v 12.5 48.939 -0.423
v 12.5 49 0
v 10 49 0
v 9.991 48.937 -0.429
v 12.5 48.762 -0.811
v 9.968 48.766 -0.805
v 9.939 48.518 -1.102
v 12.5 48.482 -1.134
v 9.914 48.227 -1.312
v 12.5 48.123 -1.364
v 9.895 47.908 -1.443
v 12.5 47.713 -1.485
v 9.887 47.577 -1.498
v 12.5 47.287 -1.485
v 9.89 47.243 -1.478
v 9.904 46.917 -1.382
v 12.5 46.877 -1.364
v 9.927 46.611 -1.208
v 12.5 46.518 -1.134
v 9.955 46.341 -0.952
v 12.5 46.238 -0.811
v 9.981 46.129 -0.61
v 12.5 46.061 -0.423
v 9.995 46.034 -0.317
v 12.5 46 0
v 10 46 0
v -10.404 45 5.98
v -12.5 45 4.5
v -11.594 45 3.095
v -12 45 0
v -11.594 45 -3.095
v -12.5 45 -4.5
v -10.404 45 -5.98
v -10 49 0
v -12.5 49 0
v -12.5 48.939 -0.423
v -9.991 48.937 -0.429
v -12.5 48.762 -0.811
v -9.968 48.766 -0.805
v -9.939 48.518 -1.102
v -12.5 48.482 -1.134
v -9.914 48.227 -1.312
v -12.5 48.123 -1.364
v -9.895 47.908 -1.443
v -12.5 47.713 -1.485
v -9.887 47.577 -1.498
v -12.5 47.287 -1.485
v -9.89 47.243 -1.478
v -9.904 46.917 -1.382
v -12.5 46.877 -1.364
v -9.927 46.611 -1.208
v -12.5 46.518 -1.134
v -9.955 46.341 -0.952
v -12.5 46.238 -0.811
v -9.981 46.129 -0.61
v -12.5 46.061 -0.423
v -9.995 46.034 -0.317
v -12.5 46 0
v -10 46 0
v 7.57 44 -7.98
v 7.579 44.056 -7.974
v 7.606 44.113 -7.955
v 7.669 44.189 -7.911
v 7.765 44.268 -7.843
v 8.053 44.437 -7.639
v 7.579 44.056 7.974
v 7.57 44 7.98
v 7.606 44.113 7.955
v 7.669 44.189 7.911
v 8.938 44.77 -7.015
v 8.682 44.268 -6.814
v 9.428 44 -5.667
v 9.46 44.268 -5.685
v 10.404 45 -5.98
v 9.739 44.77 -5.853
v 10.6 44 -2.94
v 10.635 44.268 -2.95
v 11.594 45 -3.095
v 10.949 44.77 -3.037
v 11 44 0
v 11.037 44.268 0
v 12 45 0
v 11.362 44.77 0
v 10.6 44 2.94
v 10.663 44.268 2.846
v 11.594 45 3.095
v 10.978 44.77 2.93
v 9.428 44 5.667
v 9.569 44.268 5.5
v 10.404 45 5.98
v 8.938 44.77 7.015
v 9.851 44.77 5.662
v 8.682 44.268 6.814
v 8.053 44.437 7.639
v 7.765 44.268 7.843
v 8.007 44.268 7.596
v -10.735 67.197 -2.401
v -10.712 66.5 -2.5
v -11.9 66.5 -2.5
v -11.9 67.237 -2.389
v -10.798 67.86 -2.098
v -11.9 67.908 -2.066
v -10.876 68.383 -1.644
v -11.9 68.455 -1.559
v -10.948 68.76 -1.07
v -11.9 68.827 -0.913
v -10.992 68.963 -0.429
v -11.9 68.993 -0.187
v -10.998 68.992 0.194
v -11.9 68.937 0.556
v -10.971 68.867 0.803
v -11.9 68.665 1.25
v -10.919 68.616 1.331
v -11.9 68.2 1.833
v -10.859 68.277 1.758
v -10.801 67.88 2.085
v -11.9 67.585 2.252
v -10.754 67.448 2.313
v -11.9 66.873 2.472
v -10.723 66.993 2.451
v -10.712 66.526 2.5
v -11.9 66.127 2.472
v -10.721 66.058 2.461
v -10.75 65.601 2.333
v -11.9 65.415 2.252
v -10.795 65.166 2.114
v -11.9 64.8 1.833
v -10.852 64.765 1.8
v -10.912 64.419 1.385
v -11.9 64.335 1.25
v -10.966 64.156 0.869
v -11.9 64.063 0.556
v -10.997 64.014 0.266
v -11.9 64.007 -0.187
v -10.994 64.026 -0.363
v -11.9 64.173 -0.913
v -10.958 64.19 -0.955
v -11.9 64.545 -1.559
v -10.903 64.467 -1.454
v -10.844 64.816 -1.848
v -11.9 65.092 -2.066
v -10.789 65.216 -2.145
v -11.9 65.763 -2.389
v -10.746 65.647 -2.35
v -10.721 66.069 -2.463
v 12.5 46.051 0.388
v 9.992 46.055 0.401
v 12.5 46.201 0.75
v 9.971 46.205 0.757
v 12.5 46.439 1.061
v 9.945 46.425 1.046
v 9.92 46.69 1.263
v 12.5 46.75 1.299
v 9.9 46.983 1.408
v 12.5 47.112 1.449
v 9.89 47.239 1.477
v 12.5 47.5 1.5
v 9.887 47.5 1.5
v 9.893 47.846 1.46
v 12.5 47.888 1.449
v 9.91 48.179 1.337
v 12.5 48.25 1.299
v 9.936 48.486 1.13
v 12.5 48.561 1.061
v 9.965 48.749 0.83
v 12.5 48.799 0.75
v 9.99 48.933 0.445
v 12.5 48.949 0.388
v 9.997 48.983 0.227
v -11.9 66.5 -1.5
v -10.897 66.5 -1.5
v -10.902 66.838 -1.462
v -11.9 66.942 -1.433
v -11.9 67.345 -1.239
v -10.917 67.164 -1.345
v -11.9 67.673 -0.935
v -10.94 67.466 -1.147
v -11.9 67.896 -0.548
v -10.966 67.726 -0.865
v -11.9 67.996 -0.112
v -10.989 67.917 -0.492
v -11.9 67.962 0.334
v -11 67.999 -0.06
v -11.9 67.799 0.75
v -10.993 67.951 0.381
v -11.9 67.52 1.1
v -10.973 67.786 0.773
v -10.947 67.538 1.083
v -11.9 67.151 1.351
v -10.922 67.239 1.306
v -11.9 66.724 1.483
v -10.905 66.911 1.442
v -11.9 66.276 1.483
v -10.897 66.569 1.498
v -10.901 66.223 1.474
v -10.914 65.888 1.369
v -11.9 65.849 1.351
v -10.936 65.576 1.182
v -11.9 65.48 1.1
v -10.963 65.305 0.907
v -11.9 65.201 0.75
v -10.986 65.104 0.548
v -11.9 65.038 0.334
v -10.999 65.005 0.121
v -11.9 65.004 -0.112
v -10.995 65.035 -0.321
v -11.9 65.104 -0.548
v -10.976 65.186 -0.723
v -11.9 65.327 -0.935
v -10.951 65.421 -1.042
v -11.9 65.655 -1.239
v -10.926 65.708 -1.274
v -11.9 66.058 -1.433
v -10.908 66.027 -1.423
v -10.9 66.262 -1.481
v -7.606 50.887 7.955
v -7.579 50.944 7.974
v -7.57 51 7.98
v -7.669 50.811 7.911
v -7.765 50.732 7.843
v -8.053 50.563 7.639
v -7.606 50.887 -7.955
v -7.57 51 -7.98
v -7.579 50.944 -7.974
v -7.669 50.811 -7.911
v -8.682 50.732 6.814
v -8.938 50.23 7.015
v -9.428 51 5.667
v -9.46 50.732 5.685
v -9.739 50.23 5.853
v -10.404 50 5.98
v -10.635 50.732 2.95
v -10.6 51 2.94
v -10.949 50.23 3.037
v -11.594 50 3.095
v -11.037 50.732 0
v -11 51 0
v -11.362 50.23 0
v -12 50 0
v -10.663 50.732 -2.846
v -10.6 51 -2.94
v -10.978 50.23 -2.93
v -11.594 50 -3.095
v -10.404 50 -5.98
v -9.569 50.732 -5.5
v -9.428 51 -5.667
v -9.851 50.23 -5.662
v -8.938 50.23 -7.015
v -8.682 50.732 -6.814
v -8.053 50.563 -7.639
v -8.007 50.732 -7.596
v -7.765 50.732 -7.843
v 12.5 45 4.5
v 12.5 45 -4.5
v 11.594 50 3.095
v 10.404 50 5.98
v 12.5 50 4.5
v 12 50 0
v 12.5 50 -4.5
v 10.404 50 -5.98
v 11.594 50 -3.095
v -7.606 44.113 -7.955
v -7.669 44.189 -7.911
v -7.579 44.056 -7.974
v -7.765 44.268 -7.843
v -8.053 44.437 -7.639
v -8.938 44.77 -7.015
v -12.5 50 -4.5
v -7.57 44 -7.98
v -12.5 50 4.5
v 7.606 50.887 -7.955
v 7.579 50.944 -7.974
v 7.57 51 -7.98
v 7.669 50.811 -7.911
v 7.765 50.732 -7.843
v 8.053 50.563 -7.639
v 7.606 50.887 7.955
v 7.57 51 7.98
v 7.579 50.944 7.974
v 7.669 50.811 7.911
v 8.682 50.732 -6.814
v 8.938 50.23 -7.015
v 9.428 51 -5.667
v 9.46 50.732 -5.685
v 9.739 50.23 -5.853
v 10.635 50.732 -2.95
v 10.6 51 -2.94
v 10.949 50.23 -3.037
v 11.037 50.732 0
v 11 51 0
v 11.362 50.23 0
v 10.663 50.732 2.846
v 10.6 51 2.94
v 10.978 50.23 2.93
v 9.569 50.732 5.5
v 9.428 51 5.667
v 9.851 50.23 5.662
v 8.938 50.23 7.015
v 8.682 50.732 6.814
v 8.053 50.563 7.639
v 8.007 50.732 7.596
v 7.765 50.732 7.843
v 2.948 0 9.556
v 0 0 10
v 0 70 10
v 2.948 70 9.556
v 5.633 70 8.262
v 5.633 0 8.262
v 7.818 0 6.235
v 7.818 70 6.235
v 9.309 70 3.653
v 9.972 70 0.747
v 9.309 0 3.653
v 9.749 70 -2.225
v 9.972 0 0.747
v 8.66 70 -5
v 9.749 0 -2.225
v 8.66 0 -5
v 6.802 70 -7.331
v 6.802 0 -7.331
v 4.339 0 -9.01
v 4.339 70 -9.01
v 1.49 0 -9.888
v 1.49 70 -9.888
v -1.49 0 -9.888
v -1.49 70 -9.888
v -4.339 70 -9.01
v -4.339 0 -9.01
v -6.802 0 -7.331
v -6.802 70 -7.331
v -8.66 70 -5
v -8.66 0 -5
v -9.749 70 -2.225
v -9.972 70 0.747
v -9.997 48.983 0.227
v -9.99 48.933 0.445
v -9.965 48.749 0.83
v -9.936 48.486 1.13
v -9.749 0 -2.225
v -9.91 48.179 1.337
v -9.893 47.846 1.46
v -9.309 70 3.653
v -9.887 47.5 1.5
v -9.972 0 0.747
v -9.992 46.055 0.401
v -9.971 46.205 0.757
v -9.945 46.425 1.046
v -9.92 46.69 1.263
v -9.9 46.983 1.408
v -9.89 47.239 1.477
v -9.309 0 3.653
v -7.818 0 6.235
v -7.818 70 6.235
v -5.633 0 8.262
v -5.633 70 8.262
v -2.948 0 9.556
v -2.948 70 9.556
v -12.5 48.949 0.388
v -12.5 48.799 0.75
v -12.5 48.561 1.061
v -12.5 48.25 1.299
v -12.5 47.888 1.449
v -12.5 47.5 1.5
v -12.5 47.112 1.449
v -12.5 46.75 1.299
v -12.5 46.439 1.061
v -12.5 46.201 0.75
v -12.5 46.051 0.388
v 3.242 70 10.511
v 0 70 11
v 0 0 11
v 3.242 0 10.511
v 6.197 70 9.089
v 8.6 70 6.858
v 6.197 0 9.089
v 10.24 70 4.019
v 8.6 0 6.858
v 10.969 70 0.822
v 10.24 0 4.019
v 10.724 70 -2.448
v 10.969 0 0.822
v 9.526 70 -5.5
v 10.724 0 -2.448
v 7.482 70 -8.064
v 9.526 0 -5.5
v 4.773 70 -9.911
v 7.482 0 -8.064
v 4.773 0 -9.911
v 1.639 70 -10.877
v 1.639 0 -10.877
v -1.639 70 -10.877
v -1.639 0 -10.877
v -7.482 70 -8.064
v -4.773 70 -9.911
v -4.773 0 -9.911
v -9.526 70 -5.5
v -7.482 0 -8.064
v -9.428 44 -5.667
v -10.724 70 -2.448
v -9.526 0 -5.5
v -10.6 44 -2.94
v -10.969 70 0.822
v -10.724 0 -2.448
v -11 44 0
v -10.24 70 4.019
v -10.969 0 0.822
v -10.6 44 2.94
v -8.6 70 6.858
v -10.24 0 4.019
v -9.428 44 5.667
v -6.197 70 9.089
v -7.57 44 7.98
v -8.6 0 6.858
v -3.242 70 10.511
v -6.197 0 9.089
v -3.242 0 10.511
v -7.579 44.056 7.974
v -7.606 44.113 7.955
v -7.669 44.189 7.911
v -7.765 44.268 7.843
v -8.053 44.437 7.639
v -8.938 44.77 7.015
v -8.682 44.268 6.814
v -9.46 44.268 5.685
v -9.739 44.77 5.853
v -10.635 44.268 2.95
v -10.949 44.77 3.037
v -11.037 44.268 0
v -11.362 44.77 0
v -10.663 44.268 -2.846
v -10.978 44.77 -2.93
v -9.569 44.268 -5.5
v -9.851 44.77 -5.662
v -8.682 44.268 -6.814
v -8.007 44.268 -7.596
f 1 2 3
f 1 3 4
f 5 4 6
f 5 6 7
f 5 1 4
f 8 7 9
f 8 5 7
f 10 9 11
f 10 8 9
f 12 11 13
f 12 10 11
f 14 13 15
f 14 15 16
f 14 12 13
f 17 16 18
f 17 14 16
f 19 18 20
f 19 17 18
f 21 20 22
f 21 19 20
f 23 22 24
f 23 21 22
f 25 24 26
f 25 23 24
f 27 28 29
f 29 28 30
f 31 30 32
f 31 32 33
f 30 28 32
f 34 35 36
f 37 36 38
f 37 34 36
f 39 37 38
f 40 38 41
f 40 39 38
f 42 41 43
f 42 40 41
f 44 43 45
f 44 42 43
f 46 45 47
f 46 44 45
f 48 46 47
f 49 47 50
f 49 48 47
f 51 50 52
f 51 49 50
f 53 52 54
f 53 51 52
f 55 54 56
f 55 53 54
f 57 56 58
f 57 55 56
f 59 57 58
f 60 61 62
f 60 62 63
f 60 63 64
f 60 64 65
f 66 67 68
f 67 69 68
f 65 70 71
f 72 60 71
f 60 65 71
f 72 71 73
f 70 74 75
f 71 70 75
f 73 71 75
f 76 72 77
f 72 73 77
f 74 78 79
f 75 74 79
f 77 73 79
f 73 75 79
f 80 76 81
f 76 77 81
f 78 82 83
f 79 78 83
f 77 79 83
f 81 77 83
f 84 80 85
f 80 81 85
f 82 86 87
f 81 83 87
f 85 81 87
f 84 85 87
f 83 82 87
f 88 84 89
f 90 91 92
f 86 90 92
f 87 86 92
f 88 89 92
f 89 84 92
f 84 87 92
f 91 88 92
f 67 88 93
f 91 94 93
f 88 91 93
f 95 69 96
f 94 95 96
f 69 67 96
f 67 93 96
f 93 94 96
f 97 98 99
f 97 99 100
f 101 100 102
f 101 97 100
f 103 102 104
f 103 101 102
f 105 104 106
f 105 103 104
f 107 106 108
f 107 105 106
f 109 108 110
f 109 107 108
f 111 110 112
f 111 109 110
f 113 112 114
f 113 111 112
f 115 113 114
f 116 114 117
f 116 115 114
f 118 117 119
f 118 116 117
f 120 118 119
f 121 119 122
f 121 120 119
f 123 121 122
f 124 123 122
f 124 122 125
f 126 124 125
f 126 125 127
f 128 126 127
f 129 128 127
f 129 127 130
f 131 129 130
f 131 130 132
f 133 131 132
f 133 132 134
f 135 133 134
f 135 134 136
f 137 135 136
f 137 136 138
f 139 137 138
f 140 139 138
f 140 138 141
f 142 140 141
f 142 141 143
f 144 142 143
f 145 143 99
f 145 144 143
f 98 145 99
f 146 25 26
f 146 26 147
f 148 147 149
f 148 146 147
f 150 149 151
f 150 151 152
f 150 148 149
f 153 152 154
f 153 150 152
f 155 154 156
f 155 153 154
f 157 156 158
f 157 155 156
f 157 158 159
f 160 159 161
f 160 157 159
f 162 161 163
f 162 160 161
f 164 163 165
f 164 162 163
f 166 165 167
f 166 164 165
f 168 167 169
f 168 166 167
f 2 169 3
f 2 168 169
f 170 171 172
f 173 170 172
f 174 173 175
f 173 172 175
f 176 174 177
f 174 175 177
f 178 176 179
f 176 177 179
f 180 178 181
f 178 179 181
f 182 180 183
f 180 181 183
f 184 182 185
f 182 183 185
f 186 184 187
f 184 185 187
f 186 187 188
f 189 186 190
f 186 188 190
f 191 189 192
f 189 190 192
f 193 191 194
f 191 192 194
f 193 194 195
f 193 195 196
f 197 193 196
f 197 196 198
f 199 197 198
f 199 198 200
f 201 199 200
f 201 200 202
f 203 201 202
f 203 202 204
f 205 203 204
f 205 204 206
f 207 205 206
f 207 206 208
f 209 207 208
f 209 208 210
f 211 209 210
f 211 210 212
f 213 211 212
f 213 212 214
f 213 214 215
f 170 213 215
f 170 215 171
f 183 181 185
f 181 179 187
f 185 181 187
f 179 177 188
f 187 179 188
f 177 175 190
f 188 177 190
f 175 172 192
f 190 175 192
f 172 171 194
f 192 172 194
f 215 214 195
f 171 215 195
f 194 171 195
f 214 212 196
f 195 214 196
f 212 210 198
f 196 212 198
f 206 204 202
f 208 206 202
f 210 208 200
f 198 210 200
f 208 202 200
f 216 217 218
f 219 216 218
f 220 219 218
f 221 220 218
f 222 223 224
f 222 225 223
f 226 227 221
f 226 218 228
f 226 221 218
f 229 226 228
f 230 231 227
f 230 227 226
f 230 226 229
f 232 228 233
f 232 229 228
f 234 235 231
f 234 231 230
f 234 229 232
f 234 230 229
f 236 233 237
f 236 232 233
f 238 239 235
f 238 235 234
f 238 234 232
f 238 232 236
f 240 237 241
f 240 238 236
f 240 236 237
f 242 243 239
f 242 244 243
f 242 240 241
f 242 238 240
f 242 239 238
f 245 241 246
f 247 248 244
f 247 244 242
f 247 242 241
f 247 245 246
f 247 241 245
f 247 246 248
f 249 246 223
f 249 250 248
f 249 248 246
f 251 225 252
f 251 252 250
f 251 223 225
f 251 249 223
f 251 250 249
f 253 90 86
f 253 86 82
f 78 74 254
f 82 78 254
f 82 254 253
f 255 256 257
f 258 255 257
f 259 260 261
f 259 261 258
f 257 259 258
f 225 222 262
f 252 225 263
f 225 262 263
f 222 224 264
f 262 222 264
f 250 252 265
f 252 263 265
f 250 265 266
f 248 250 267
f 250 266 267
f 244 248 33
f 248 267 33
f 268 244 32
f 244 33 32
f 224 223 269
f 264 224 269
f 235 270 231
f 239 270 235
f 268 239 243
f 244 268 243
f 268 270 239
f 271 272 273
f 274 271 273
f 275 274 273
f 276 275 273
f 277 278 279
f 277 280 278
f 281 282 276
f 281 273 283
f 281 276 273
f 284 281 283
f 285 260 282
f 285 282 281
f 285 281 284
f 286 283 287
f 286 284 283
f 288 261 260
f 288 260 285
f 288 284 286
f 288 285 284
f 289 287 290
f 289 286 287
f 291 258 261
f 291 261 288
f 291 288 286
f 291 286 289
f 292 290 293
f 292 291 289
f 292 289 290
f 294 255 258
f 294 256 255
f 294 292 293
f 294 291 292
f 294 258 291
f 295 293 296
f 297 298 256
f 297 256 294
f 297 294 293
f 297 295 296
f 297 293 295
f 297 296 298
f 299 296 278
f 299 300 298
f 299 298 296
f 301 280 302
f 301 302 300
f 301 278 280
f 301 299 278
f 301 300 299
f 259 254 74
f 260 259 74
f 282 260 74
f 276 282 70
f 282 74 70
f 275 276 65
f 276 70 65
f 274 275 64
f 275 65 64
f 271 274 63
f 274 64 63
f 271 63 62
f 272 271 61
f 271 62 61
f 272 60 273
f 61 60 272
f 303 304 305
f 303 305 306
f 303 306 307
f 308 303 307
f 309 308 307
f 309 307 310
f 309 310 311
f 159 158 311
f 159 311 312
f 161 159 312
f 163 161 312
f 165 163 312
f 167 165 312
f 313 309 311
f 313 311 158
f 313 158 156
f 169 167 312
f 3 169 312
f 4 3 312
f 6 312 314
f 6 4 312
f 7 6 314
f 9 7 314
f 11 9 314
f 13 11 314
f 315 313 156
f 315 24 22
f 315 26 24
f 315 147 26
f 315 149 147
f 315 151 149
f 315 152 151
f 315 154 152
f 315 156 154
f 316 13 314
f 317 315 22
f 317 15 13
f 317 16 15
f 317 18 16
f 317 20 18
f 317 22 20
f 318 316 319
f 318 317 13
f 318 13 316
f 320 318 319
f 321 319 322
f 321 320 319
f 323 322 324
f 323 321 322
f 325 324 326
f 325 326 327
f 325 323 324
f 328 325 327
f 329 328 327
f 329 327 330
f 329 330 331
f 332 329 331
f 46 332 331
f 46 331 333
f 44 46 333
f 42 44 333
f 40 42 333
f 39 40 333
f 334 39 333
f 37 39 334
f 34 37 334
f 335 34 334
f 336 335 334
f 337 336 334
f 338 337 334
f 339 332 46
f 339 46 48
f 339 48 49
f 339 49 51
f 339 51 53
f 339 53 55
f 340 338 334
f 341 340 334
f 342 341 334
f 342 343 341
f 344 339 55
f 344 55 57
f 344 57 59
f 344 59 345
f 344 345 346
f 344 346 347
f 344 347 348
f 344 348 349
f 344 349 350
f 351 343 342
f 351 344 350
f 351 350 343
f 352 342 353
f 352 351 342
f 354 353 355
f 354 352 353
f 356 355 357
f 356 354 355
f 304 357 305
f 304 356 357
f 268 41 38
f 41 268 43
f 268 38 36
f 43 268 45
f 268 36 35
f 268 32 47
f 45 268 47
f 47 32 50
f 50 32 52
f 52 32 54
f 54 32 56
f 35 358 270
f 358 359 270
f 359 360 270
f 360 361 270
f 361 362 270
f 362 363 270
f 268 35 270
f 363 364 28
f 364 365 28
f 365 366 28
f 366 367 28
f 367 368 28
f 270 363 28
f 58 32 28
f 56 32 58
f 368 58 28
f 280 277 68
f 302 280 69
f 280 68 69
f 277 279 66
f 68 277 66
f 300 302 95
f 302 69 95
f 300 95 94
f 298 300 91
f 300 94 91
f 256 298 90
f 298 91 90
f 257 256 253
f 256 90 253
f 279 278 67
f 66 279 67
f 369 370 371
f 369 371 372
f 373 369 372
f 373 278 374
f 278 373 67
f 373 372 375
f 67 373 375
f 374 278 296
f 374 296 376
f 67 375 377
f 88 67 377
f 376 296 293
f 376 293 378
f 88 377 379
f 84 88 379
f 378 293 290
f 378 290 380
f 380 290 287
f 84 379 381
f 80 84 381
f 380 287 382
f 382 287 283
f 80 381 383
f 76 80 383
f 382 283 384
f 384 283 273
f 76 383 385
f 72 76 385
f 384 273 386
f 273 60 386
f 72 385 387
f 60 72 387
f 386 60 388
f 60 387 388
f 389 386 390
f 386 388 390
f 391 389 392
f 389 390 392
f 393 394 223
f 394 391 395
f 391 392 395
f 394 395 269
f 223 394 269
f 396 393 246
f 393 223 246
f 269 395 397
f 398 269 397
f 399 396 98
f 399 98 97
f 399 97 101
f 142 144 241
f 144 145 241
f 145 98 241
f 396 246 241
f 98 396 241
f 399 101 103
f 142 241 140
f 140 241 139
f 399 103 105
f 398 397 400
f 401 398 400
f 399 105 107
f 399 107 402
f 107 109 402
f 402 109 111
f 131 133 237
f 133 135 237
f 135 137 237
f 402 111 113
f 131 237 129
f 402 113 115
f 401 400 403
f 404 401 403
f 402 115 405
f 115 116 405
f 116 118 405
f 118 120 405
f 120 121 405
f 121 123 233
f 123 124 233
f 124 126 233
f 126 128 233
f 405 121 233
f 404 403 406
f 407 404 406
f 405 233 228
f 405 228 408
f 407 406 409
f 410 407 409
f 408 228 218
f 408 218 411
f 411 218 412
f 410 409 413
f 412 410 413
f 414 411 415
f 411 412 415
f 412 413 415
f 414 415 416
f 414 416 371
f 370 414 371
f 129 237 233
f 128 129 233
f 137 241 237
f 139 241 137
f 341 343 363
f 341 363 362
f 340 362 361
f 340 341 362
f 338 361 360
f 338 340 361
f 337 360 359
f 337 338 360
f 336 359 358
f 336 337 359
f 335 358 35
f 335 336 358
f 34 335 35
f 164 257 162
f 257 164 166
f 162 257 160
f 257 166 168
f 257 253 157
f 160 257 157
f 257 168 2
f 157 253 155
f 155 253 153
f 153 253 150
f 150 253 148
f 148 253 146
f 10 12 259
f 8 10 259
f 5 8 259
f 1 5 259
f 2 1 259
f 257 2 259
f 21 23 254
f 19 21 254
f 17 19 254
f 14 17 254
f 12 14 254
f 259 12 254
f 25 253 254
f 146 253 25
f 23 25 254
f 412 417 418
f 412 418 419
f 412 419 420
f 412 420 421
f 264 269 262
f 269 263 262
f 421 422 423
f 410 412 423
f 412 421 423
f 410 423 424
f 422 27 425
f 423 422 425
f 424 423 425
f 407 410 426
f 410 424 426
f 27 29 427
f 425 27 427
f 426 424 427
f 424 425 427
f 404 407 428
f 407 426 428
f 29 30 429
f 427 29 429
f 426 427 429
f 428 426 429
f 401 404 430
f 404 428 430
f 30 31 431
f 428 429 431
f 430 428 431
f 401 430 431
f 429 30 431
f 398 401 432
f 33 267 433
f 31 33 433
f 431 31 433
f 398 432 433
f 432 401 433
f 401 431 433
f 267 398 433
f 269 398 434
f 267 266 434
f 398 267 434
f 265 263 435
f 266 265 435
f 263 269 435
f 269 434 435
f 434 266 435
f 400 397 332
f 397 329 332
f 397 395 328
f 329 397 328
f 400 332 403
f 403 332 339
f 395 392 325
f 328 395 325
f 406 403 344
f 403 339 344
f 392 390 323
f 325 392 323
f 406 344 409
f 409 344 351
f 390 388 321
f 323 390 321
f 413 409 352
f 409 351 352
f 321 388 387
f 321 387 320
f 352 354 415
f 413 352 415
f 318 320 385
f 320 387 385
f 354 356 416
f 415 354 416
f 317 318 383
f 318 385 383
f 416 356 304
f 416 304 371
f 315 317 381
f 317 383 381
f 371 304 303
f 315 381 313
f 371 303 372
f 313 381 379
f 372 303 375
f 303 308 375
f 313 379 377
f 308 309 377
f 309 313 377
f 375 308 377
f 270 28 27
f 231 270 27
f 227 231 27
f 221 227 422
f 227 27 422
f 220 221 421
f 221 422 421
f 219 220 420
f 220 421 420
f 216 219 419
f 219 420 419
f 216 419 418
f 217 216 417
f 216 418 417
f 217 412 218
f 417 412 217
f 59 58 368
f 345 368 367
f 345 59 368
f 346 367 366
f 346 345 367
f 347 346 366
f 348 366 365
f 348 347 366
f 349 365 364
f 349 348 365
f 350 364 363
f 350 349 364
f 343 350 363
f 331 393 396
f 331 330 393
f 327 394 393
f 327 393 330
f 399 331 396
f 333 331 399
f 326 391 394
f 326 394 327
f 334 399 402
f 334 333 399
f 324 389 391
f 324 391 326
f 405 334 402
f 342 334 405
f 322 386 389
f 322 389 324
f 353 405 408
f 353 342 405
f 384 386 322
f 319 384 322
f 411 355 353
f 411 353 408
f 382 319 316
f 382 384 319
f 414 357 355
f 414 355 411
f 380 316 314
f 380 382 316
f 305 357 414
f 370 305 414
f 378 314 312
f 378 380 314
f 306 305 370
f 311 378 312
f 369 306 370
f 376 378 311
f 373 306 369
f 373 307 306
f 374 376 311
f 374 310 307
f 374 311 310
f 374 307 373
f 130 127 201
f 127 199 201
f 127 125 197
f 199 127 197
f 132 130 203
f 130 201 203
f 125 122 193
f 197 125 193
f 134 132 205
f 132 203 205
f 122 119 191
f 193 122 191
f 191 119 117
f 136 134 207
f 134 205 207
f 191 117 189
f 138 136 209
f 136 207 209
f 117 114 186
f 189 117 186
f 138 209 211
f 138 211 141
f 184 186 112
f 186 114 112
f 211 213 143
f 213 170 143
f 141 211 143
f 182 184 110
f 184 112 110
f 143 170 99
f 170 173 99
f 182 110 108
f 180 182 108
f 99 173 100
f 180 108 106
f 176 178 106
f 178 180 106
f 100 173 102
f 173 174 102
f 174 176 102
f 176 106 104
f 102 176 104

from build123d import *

# Parameters (mm, degrees)
CROQUIS1_R                 = 11
CROQUIS1_R_2               = 10
SALIENTE_EXTRUIR1_DEPTH    = 70
SALIENTE_EXTRUIR2_START    = -5
SALIENTE_EXTRUIR2_DEPTH    = 5
CORTAR_EXTRUIR1_DEPTH      = 76.139869577
CORTAR_EXTRUIR1_DEPTH_BACK = 76.139869577
REDONDEO1_R                = 1
SALIENTE_EXTRUIR3_START    = -10.5
CROQUIS4_R                 = 2.5
CROQUIS4_R_2               = 1.5
SALIENTE_EXTRUIR3_DEPTH    = 1.4


with BuildPart() as part:
    # Croquis1 → Saliente-Extruir1 (new body)
    with BuildSketch(Plane(origin=(0, 0, 0), x_dir=(1, 0, 0), z_dir=(0, 1, 0))):
        with Locations(Location((0, 0, 0), (0, 0, 270))):
            Circle(CROQUIS1_R)
        with Locations(Location((0, 0, 0), (0, 0, 270))):
            Circle(CROQUIS1_R_2, mode=Mode.SUBTRACT)
    extrude(amount=SALIENTE_EXTRUIR1_DEPTH)

    # Croquis2 → Saliente-Extruir2 (add)
    with BuildSketch(Plane(origin=(0, 50, 0), x_dir=(1, 0, 0), z_dir=(0, 1, 0)).offset(SALIENTE_EXTRUIR2_START)):
        with BuildLine():
            Line((-12.5, 4.5), (-12.5, -4.5))
            Line((-12.5, -4.5), (-7.570478535, -7.980467076))
            ThreePointArc((-7.570478535, -7.980467076), (-11, 0), (-7.570478535, 7.980467076))
            Line((-7.570478535, 7.980467076), (-12.5, 4.5))
        make_face()
        with BuildLine():
            Line((12.5, -4.5), (12.5, 4.5))
            Line((12.5, 4.5), (7.570478535, 7.980467076))
            ThreePointArc((7.570478535, 7.980467076), (11, 0), (7.570478535, -7.980467076))
            Line((7.570478535, -7.980467076), (12.5, -4.5))
        make_face()
    extrude(amount=SALIENTE_EXTRUIR2_DEPTH)

    # Croquis3 → Cortar-Extruir1 (cut, two sides: drawn at the far end of the back side and taken through both)
    with BuildSketch(Plane.ZY.offset(12.5).offset(-CORTAR_EXTRUIR1_DEPTH_BACK)):
        with BuildLine():
            ThreePointArc((0, 49), (-1.5, 47.5), (0, 46))
            Line((0, 46), (0, 49))
        make_face()
        with BuildLine():
            Line((0, 49), (0, 46))
            ThreePointArc((0, 46), (1.060660172, 46.439339828), (1.5, 47.5))
            ThreePointArc((1.5, 47.5), (1.060660172, 48.560660172), (0, 49))
        make_face()
    extrude(amount=CORTAR_EXTRUIR1_DEPTH + CORTAR_EXTRUIR1_DEPTH_BACK, mode=Mode.SUBTRACT)

    # Redondeo1
    redondeo1_edges = [part.edges().sort_by_distance(p)[0] for p in [
        (-11, 50, 0),
        (-11, 45, 0),
        (11, 45, 0),
        (11, 50, 0),
    ]]
    fillet(redondeo1_edges, radius=REDONDEO1_R)

    # Croquis4 → Saliente-Extruir3 (add)
    with BuildSketch(Plane(origin=(0, 0, 0), x_dir=(0, 0, -1), z_dir=(1, 0, 0)).offset(SALIENTE_EXTRUIR3_START)):
        with Locations((0, 66.5)):
            Circle(CROQUIS4_R)
        with Locations((0, 66.5)):
            Circle(CROQUIS4_R_2, mode=Mode.SUBTRACT)
    extrude(amount=-SALIENTE_EXTRUIR3_DEPTH)


solid = part.part
